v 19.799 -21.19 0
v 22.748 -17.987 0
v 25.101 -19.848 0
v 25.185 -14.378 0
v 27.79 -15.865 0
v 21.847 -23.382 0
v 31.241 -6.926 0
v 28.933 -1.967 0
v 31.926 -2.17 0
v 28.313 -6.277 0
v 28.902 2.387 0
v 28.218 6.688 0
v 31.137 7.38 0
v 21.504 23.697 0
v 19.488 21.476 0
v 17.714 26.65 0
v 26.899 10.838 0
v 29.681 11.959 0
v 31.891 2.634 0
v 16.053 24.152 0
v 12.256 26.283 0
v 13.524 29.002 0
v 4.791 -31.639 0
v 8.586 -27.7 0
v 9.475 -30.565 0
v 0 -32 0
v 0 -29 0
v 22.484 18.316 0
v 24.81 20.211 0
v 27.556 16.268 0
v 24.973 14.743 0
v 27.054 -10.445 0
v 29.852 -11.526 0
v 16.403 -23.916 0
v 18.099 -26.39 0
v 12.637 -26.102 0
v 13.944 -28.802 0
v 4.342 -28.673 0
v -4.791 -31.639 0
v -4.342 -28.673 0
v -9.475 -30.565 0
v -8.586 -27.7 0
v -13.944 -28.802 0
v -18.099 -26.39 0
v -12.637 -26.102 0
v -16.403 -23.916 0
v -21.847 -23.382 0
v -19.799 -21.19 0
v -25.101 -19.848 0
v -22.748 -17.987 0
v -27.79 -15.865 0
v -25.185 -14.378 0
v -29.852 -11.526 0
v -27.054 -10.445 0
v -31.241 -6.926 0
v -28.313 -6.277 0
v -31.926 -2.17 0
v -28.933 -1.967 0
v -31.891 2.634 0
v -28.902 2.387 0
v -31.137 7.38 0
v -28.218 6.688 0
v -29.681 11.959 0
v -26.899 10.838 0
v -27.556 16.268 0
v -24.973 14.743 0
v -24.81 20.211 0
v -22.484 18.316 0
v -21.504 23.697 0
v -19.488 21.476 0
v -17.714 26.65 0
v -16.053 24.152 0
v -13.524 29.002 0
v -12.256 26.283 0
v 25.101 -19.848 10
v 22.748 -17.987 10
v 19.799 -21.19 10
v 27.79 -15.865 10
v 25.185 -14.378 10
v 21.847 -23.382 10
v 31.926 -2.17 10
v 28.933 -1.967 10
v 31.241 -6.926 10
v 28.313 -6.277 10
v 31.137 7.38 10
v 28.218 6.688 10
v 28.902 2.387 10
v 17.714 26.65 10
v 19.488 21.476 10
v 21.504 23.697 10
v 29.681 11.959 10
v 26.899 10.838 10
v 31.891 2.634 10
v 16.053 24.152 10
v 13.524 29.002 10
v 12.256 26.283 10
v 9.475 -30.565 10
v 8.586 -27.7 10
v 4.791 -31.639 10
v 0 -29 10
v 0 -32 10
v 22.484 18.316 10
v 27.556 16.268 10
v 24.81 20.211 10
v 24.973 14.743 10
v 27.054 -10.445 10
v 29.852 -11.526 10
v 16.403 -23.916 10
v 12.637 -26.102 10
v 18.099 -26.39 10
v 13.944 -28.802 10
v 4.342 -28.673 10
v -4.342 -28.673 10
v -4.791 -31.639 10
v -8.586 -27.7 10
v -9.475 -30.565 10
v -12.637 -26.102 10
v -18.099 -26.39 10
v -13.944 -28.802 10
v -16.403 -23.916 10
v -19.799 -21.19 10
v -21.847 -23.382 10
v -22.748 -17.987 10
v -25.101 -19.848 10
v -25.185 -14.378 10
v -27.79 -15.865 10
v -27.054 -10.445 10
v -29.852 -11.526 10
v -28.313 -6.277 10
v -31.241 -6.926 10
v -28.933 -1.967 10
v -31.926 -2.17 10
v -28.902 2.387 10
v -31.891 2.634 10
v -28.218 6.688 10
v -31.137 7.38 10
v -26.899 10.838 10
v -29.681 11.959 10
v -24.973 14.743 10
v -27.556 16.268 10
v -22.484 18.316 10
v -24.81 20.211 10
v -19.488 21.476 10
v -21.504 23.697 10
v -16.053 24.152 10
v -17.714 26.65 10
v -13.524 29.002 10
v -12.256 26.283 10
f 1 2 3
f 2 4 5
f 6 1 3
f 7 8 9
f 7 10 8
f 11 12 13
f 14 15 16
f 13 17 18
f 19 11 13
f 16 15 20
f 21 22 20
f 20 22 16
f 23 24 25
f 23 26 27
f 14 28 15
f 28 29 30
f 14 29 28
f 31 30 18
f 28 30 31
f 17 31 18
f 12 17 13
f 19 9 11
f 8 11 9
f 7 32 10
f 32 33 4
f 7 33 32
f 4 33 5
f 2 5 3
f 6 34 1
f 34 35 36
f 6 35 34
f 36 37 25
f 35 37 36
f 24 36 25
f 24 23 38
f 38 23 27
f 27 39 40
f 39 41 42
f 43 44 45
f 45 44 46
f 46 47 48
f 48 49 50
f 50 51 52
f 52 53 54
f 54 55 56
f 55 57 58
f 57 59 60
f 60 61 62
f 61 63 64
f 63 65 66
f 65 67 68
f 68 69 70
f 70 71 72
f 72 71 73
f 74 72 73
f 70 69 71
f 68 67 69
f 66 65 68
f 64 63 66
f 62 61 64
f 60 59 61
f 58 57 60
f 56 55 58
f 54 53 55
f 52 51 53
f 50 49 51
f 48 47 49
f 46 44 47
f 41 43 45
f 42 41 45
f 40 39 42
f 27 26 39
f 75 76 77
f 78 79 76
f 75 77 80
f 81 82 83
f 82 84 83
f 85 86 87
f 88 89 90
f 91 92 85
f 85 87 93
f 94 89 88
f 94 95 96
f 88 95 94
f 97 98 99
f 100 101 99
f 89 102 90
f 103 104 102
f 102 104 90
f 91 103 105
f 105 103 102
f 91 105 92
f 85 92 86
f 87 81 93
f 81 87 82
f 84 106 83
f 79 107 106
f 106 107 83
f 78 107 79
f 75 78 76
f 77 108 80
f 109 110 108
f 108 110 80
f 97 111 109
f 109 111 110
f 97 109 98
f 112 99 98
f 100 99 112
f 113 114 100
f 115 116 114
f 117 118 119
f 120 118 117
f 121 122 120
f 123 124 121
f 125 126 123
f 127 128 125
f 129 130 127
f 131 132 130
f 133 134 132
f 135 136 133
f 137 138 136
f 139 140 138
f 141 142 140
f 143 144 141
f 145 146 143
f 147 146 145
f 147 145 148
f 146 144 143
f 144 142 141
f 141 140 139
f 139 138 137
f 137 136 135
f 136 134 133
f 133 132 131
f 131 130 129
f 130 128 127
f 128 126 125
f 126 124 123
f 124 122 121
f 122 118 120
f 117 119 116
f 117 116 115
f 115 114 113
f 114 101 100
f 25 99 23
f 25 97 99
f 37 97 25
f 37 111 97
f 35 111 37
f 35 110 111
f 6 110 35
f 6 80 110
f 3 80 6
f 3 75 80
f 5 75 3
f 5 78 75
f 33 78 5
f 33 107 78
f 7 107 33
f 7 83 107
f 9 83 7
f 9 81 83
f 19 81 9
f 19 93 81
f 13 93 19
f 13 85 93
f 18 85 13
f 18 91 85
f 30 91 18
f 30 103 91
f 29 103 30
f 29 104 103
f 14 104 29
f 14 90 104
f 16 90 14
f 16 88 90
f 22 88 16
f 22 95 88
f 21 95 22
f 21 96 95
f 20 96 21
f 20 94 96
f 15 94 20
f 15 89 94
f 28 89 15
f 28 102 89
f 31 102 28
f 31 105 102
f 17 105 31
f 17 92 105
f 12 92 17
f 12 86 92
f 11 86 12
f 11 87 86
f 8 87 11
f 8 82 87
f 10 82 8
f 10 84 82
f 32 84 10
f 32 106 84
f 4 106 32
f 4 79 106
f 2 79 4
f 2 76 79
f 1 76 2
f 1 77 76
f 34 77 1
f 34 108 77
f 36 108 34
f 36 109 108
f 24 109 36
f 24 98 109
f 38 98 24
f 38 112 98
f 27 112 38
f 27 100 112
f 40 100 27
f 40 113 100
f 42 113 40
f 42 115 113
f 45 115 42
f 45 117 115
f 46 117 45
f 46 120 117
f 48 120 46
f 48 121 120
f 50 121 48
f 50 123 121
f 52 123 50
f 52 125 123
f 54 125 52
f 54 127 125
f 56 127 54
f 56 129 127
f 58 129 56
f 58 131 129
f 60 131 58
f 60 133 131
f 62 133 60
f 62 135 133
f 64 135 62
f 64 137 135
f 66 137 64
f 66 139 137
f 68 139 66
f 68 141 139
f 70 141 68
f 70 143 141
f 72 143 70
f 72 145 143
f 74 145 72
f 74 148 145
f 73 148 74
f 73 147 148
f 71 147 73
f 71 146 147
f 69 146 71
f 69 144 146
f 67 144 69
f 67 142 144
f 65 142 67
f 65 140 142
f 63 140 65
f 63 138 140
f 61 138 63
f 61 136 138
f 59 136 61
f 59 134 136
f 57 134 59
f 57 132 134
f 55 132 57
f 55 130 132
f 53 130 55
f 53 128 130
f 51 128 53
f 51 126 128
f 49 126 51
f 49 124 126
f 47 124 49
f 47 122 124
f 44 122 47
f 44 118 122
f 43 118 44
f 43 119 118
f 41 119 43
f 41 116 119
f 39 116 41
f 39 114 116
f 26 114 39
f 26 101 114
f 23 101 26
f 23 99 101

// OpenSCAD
$fn = 32;

// ----------------------------------------------------------------------
// Spring clip: 64 mm outside, 3 mm band, 50 degree opening
// ----------------------------------------------------------------------

// --- parameters (mm) ---
outer_r = 32;             // clip outside radius
inner_r = 29;             // clip bore radius
band = 3;                 // band thickness
clip_w = 10;              // clip width
opening = 50;             // opening angle

clip_profile = [[-13.524, 29.002], [-17.714, 26.65], [-21.504, 23.697], [-24.81, 20.211], [-27.556, 16.268], [-29.681, 11.959], [-31.137, 7.38], [-31.891, 2.634], [-31.926, -2.17], [-31.241, -6.926], [-29.852, -11.526], [-27.79, -15.865], [-25.101, -19.848], [-21.847, -23.382], [-18.099, -26.39], [-13.944, -28.802], [-9.475, -30.565], [-4.791, -31.639], [0, -32], [4.791, -31.639], [9.475, -30.565], [13.944, -28.802], [18.099, -26.39], [21.847, -23.382], [25.101, -19.848], [27.79, -15.865], [29.852, -11.526], [31.241, -6.926], [31.926, -2.17], [31.891, 2.634], [31.137, 7.38], [29.681, 11.959], [27.556, 16.268], [24.81, 20.211], [21.504, 23.697], [17.714, 26.65], [13.524, 29.002], [12.256, 26.283], [16.053, 24.152], [19.488, 21.476], [22.484, 18.316], [24.973, 14.743], [26.899, 10.838], [28.218, 6.688], [28.902, 2.387], [28.933, -1.967], [28.313, -6.277], [27.054, -10.445], [25.185, -14.378], [22.748, -17.987], [19.799, -21.19], [16.403, -23.916], [12.637, -26.102], [8.586, -27.7], [4.342, -28.673], [0, -29], [-4.342, -28.673], [-8.586, -27.7], [-12.637, -26.102], [-16.403, -23.916], [-19.799, -21.19], [-22.748, -17.987], [-25.185, -14.378], [-27.054, -10.445], [-28.313, -6.277], [-28.933, -1.967], [-28.902, 2.387], [-28.218, 6.688], [-26.899, 10.838], [-24.973, 14.743], [-22.484, 18.316], [-19.488, 21.476], [-16.053, 24.152], [-12.256, 26.283]];

difference() {
  union() {
    linear_extrude(height = clip_w) polygon(clip_profile);
  }
}
